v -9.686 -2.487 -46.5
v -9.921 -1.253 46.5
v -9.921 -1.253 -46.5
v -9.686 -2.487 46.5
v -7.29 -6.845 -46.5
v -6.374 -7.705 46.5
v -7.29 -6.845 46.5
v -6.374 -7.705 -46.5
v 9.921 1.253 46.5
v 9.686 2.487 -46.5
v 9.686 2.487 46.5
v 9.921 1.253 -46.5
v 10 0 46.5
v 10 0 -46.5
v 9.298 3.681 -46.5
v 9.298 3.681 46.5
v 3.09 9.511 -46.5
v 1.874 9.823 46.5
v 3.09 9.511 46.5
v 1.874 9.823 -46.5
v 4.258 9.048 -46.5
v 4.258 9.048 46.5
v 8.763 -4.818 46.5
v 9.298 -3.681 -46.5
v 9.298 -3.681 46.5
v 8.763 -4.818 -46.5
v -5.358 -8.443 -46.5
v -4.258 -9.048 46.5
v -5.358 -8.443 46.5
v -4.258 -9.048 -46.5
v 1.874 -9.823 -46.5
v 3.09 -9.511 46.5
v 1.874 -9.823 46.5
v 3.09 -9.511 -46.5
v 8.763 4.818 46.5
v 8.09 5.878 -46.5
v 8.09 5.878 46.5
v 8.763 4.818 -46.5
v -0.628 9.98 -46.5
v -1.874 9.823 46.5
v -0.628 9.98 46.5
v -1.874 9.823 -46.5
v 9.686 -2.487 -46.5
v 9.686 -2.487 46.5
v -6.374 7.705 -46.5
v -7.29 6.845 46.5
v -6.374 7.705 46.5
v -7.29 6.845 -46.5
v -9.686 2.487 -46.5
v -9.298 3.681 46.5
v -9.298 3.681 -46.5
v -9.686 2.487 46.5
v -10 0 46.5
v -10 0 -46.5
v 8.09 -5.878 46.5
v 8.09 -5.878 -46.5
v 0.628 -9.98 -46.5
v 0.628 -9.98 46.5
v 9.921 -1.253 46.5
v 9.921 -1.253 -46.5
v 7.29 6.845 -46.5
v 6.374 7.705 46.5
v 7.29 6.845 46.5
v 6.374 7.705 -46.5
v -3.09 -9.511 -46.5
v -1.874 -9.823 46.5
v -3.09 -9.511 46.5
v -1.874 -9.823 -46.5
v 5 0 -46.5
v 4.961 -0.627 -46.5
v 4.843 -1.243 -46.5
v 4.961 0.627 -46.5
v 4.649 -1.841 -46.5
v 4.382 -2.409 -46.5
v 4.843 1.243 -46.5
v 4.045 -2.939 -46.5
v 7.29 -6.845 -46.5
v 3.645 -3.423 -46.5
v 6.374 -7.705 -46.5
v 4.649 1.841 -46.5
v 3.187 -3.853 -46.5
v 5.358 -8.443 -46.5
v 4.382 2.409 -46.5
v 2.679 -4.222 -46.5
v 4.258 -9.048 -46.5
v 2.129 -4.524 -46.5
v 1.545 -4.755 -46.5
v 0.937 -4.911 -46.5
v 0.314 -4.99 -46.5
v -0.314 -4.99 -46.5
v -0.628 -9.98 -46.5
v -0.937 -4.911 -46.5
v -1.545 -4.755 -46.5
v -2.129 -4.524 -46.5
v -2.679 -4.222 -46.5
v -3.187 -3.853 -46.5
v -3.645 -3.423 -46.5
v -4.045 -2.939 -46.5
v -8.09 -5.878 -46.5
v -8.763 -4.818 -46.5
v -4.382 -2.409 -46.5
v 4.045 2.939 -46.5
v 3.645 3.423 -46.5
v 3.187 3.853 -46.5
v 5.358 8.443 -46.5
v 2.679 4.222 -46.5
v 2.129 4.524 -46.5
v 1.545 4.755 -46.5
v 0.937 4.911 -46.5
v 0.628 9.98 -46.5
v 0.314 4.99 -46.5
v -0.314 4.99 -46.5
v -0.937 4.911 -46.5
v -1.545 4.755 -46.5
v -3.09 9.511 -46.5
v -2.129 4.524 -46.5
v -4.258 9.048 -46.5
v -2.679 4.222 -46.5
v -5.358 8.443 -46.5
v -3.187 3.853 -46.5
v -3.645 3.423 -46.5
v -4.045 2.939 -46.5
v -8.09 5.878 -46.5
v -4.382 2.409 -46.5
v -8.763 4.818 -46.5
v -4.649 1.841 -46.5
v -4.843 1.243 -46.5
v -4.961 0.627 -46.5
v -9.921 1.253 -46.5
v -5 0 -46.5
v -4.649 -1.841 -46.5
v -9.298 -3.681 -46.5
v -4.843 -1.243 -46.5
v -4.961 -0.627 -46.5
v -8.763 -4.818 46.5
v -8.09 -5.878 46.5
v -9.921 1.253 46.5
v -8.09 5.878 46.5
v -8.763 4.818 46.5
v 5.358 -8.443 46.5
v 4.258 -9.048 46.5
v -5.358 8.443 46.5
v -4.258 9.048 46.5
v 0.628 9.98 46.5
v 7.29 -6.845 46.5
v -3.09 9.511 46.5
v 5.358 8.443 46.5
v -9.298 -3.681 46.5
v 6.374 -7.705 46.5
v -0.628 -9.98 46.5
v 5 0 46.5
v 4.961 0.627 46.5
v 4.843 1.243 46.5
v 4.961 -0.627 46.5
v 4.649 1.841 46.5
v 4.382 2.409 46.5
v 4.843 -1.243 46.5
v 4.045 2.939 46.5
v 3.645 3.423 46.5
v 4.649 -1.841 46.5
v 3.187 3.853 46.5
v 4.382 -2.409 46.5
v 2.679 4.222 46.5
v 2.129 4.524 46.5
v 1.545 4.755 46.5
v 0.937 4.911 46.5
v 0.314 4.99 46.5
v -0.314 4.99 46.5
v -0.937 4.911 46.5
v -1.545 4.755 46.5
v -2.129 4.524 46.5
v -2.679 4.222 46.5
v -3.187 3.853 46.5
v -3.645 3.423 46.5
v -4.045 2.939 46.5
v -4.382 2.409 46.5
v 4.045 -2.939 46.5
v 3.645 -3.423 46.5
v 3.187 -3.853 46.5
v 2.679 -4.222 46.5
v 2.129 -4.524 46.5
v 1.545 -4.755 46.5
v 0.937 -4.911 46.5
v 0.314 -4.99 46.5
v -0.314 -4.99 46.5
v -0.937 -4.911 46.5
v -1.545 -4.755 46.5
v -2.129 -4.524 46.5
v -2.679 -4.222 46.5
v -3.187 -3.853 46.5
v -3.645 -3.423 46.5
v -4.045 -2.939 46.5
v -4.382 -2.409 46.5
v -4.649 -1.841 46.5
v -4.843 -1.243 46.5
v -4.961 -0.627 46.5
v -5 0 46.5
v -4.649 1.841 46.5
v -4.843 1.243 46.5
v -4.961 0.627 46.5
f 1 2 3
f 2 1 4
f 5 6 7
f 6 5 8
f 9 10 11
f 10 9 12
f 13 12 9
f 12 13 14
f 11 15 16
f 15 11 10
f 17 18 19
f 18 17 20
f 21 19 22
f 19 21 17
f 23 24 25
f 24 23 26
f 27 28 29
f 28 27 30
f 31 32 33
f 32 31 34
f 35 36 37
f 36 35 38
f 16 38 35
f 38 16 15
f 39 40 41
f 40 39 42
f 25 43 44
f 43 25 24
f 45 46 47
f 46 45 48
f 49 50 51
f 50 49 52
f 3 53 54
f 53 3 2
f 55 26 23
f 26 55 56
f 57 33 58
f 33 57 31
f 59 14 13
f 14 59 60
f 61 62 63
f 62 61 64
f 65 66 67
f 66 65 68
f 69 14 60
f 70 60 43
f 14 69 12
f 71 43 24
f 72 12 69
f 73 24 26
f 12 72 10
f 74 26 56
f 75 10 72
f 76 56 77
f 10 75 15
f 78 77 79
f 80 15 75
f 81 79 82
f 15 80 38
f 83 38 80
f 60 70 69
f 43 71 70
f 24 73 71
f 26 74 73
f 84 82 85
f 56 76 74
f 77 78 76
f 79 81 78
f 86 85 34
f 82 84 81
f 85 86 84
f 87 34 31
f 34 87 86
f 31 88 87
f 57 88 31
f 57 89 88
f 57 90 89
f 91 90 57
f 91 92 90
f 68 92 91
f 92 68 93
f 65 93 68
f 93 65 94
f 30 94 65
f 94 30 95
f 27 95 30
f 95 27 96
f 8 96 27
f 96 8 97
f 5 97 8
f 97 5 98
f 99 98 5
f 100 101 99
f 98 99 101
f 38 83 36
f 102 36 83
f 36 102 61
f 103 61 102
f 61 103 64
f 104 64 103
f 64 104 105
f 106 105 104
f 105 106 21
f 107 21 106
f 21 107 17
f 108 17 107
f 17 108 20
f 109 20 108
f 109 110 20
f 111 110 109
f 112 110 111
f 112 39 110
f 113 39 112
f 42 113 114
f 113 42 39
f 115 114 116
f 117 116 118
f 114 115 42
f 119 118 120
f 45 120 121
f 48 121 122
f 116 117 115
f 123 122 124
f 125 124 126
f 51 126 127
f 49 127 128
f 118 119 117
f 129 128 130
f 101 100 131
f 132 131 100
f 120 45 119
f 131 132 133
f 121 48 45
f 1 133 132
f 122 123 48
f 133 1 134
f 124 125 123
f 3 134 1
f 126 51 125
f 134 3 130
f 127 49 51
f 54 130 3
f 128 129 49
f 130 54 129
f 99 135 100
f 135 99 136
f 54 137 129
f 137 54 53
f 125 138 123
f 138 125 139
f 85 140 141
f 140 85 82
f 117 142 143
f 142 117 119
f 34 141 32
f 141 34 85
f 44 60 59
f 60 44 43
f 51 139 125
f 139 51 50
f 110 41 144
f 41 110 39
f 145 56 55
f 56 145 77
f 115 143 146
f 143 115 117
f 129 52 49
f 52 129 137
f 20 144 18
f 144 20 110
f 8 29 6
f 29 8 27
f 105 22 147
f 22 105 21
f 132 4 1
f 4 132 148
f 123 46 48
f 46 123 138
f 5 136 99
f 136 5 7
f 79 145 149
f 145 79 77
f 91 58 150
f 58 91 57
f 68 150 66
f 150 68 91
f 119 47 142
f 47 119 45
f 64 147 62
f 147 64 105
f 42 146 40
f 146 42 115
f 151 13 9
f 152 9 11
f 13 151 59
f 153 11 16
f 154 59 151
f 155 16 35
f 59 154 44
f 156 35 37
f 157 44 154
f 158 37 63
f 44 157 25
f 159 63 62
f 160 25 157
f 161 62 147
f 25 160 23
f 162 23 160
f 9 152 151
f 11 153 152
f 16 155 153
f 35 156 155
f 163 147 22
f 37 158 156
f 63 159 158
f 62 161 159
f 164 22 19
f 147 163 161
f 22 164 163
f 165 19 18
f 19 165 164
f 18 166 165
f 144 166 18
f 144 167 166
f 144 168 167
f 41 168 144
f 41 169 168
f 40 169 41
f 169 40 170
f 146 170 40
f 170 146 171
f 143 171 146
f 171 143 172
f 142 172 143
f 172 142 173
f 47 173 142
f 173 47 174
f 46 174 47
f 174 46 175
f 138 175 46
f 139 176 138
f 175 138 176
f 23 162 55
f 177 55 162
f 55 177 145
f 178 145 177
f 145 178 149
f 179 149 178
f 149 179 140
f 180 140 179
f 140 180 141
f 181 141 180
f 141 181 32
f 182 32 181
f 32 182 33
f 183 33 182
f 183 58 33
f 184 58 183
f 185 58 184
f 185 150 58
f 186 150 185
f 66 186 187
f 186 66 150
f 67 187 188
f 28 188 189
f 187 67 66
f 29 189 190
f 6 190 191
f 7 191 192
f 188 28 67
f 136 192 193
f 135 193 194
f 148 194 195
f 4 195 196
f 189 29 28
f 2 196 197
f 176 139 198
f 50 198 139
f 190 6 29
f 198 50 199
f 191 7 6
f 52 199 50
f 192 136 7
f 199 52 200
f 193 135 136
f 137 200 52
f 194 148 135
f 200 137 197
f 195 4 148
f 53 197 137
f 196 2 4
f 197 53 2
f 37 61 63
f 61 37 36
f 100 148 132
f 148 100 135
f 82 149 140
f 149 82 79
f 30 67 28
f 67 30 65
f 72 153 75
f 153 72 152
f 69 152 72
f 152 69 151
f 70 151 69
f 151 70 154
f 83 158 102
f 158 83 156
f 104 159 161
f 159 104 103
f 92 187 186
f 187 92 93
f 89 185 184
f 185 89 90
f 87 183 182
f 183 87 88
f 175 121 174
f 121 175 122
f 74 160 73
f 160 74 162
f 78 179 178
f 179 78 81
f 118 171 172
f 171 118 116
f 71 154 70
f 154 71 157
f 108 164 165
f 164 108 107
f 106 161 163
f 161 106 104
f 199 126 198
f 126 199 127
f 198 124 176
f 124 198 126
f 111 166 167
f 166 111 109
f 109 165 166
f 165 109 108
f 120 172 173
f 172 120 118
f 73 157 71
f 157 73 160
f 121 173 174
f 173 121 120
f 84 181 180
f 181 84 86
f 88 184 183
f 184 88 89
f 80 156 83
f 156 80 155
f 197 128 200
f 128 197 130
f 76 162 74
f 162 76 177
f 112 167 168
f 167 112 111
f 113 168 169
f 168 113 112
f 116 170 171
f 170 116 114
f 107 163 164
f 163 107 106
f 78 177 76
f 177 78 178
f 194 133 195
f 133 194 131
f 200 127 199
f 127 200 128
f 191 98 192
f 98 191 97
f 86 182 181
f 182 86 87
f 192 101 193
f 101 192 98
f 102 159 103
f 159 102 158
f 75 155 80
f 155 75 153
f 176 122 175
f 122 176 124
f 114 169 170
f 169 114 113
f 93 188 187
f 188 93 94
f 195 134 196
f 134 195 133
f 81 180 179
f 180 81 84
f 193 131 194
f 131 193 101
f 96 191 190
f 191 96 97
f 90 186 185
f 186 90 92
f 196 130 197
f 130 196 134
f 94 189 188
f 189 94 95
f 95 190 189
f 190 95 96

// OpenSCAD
$fn = 50;


difference() {
	union() {
		translate(v = [0, 0, -46.5000000000]) {
			cylinder(h = 93, r = 10.0000000000);
		}
	}
	union() {
		translate(v = [0, 0, -100.0000000000]) {
			cylinder(h = 200, r = 5.0000000000);
		}
	}
}
